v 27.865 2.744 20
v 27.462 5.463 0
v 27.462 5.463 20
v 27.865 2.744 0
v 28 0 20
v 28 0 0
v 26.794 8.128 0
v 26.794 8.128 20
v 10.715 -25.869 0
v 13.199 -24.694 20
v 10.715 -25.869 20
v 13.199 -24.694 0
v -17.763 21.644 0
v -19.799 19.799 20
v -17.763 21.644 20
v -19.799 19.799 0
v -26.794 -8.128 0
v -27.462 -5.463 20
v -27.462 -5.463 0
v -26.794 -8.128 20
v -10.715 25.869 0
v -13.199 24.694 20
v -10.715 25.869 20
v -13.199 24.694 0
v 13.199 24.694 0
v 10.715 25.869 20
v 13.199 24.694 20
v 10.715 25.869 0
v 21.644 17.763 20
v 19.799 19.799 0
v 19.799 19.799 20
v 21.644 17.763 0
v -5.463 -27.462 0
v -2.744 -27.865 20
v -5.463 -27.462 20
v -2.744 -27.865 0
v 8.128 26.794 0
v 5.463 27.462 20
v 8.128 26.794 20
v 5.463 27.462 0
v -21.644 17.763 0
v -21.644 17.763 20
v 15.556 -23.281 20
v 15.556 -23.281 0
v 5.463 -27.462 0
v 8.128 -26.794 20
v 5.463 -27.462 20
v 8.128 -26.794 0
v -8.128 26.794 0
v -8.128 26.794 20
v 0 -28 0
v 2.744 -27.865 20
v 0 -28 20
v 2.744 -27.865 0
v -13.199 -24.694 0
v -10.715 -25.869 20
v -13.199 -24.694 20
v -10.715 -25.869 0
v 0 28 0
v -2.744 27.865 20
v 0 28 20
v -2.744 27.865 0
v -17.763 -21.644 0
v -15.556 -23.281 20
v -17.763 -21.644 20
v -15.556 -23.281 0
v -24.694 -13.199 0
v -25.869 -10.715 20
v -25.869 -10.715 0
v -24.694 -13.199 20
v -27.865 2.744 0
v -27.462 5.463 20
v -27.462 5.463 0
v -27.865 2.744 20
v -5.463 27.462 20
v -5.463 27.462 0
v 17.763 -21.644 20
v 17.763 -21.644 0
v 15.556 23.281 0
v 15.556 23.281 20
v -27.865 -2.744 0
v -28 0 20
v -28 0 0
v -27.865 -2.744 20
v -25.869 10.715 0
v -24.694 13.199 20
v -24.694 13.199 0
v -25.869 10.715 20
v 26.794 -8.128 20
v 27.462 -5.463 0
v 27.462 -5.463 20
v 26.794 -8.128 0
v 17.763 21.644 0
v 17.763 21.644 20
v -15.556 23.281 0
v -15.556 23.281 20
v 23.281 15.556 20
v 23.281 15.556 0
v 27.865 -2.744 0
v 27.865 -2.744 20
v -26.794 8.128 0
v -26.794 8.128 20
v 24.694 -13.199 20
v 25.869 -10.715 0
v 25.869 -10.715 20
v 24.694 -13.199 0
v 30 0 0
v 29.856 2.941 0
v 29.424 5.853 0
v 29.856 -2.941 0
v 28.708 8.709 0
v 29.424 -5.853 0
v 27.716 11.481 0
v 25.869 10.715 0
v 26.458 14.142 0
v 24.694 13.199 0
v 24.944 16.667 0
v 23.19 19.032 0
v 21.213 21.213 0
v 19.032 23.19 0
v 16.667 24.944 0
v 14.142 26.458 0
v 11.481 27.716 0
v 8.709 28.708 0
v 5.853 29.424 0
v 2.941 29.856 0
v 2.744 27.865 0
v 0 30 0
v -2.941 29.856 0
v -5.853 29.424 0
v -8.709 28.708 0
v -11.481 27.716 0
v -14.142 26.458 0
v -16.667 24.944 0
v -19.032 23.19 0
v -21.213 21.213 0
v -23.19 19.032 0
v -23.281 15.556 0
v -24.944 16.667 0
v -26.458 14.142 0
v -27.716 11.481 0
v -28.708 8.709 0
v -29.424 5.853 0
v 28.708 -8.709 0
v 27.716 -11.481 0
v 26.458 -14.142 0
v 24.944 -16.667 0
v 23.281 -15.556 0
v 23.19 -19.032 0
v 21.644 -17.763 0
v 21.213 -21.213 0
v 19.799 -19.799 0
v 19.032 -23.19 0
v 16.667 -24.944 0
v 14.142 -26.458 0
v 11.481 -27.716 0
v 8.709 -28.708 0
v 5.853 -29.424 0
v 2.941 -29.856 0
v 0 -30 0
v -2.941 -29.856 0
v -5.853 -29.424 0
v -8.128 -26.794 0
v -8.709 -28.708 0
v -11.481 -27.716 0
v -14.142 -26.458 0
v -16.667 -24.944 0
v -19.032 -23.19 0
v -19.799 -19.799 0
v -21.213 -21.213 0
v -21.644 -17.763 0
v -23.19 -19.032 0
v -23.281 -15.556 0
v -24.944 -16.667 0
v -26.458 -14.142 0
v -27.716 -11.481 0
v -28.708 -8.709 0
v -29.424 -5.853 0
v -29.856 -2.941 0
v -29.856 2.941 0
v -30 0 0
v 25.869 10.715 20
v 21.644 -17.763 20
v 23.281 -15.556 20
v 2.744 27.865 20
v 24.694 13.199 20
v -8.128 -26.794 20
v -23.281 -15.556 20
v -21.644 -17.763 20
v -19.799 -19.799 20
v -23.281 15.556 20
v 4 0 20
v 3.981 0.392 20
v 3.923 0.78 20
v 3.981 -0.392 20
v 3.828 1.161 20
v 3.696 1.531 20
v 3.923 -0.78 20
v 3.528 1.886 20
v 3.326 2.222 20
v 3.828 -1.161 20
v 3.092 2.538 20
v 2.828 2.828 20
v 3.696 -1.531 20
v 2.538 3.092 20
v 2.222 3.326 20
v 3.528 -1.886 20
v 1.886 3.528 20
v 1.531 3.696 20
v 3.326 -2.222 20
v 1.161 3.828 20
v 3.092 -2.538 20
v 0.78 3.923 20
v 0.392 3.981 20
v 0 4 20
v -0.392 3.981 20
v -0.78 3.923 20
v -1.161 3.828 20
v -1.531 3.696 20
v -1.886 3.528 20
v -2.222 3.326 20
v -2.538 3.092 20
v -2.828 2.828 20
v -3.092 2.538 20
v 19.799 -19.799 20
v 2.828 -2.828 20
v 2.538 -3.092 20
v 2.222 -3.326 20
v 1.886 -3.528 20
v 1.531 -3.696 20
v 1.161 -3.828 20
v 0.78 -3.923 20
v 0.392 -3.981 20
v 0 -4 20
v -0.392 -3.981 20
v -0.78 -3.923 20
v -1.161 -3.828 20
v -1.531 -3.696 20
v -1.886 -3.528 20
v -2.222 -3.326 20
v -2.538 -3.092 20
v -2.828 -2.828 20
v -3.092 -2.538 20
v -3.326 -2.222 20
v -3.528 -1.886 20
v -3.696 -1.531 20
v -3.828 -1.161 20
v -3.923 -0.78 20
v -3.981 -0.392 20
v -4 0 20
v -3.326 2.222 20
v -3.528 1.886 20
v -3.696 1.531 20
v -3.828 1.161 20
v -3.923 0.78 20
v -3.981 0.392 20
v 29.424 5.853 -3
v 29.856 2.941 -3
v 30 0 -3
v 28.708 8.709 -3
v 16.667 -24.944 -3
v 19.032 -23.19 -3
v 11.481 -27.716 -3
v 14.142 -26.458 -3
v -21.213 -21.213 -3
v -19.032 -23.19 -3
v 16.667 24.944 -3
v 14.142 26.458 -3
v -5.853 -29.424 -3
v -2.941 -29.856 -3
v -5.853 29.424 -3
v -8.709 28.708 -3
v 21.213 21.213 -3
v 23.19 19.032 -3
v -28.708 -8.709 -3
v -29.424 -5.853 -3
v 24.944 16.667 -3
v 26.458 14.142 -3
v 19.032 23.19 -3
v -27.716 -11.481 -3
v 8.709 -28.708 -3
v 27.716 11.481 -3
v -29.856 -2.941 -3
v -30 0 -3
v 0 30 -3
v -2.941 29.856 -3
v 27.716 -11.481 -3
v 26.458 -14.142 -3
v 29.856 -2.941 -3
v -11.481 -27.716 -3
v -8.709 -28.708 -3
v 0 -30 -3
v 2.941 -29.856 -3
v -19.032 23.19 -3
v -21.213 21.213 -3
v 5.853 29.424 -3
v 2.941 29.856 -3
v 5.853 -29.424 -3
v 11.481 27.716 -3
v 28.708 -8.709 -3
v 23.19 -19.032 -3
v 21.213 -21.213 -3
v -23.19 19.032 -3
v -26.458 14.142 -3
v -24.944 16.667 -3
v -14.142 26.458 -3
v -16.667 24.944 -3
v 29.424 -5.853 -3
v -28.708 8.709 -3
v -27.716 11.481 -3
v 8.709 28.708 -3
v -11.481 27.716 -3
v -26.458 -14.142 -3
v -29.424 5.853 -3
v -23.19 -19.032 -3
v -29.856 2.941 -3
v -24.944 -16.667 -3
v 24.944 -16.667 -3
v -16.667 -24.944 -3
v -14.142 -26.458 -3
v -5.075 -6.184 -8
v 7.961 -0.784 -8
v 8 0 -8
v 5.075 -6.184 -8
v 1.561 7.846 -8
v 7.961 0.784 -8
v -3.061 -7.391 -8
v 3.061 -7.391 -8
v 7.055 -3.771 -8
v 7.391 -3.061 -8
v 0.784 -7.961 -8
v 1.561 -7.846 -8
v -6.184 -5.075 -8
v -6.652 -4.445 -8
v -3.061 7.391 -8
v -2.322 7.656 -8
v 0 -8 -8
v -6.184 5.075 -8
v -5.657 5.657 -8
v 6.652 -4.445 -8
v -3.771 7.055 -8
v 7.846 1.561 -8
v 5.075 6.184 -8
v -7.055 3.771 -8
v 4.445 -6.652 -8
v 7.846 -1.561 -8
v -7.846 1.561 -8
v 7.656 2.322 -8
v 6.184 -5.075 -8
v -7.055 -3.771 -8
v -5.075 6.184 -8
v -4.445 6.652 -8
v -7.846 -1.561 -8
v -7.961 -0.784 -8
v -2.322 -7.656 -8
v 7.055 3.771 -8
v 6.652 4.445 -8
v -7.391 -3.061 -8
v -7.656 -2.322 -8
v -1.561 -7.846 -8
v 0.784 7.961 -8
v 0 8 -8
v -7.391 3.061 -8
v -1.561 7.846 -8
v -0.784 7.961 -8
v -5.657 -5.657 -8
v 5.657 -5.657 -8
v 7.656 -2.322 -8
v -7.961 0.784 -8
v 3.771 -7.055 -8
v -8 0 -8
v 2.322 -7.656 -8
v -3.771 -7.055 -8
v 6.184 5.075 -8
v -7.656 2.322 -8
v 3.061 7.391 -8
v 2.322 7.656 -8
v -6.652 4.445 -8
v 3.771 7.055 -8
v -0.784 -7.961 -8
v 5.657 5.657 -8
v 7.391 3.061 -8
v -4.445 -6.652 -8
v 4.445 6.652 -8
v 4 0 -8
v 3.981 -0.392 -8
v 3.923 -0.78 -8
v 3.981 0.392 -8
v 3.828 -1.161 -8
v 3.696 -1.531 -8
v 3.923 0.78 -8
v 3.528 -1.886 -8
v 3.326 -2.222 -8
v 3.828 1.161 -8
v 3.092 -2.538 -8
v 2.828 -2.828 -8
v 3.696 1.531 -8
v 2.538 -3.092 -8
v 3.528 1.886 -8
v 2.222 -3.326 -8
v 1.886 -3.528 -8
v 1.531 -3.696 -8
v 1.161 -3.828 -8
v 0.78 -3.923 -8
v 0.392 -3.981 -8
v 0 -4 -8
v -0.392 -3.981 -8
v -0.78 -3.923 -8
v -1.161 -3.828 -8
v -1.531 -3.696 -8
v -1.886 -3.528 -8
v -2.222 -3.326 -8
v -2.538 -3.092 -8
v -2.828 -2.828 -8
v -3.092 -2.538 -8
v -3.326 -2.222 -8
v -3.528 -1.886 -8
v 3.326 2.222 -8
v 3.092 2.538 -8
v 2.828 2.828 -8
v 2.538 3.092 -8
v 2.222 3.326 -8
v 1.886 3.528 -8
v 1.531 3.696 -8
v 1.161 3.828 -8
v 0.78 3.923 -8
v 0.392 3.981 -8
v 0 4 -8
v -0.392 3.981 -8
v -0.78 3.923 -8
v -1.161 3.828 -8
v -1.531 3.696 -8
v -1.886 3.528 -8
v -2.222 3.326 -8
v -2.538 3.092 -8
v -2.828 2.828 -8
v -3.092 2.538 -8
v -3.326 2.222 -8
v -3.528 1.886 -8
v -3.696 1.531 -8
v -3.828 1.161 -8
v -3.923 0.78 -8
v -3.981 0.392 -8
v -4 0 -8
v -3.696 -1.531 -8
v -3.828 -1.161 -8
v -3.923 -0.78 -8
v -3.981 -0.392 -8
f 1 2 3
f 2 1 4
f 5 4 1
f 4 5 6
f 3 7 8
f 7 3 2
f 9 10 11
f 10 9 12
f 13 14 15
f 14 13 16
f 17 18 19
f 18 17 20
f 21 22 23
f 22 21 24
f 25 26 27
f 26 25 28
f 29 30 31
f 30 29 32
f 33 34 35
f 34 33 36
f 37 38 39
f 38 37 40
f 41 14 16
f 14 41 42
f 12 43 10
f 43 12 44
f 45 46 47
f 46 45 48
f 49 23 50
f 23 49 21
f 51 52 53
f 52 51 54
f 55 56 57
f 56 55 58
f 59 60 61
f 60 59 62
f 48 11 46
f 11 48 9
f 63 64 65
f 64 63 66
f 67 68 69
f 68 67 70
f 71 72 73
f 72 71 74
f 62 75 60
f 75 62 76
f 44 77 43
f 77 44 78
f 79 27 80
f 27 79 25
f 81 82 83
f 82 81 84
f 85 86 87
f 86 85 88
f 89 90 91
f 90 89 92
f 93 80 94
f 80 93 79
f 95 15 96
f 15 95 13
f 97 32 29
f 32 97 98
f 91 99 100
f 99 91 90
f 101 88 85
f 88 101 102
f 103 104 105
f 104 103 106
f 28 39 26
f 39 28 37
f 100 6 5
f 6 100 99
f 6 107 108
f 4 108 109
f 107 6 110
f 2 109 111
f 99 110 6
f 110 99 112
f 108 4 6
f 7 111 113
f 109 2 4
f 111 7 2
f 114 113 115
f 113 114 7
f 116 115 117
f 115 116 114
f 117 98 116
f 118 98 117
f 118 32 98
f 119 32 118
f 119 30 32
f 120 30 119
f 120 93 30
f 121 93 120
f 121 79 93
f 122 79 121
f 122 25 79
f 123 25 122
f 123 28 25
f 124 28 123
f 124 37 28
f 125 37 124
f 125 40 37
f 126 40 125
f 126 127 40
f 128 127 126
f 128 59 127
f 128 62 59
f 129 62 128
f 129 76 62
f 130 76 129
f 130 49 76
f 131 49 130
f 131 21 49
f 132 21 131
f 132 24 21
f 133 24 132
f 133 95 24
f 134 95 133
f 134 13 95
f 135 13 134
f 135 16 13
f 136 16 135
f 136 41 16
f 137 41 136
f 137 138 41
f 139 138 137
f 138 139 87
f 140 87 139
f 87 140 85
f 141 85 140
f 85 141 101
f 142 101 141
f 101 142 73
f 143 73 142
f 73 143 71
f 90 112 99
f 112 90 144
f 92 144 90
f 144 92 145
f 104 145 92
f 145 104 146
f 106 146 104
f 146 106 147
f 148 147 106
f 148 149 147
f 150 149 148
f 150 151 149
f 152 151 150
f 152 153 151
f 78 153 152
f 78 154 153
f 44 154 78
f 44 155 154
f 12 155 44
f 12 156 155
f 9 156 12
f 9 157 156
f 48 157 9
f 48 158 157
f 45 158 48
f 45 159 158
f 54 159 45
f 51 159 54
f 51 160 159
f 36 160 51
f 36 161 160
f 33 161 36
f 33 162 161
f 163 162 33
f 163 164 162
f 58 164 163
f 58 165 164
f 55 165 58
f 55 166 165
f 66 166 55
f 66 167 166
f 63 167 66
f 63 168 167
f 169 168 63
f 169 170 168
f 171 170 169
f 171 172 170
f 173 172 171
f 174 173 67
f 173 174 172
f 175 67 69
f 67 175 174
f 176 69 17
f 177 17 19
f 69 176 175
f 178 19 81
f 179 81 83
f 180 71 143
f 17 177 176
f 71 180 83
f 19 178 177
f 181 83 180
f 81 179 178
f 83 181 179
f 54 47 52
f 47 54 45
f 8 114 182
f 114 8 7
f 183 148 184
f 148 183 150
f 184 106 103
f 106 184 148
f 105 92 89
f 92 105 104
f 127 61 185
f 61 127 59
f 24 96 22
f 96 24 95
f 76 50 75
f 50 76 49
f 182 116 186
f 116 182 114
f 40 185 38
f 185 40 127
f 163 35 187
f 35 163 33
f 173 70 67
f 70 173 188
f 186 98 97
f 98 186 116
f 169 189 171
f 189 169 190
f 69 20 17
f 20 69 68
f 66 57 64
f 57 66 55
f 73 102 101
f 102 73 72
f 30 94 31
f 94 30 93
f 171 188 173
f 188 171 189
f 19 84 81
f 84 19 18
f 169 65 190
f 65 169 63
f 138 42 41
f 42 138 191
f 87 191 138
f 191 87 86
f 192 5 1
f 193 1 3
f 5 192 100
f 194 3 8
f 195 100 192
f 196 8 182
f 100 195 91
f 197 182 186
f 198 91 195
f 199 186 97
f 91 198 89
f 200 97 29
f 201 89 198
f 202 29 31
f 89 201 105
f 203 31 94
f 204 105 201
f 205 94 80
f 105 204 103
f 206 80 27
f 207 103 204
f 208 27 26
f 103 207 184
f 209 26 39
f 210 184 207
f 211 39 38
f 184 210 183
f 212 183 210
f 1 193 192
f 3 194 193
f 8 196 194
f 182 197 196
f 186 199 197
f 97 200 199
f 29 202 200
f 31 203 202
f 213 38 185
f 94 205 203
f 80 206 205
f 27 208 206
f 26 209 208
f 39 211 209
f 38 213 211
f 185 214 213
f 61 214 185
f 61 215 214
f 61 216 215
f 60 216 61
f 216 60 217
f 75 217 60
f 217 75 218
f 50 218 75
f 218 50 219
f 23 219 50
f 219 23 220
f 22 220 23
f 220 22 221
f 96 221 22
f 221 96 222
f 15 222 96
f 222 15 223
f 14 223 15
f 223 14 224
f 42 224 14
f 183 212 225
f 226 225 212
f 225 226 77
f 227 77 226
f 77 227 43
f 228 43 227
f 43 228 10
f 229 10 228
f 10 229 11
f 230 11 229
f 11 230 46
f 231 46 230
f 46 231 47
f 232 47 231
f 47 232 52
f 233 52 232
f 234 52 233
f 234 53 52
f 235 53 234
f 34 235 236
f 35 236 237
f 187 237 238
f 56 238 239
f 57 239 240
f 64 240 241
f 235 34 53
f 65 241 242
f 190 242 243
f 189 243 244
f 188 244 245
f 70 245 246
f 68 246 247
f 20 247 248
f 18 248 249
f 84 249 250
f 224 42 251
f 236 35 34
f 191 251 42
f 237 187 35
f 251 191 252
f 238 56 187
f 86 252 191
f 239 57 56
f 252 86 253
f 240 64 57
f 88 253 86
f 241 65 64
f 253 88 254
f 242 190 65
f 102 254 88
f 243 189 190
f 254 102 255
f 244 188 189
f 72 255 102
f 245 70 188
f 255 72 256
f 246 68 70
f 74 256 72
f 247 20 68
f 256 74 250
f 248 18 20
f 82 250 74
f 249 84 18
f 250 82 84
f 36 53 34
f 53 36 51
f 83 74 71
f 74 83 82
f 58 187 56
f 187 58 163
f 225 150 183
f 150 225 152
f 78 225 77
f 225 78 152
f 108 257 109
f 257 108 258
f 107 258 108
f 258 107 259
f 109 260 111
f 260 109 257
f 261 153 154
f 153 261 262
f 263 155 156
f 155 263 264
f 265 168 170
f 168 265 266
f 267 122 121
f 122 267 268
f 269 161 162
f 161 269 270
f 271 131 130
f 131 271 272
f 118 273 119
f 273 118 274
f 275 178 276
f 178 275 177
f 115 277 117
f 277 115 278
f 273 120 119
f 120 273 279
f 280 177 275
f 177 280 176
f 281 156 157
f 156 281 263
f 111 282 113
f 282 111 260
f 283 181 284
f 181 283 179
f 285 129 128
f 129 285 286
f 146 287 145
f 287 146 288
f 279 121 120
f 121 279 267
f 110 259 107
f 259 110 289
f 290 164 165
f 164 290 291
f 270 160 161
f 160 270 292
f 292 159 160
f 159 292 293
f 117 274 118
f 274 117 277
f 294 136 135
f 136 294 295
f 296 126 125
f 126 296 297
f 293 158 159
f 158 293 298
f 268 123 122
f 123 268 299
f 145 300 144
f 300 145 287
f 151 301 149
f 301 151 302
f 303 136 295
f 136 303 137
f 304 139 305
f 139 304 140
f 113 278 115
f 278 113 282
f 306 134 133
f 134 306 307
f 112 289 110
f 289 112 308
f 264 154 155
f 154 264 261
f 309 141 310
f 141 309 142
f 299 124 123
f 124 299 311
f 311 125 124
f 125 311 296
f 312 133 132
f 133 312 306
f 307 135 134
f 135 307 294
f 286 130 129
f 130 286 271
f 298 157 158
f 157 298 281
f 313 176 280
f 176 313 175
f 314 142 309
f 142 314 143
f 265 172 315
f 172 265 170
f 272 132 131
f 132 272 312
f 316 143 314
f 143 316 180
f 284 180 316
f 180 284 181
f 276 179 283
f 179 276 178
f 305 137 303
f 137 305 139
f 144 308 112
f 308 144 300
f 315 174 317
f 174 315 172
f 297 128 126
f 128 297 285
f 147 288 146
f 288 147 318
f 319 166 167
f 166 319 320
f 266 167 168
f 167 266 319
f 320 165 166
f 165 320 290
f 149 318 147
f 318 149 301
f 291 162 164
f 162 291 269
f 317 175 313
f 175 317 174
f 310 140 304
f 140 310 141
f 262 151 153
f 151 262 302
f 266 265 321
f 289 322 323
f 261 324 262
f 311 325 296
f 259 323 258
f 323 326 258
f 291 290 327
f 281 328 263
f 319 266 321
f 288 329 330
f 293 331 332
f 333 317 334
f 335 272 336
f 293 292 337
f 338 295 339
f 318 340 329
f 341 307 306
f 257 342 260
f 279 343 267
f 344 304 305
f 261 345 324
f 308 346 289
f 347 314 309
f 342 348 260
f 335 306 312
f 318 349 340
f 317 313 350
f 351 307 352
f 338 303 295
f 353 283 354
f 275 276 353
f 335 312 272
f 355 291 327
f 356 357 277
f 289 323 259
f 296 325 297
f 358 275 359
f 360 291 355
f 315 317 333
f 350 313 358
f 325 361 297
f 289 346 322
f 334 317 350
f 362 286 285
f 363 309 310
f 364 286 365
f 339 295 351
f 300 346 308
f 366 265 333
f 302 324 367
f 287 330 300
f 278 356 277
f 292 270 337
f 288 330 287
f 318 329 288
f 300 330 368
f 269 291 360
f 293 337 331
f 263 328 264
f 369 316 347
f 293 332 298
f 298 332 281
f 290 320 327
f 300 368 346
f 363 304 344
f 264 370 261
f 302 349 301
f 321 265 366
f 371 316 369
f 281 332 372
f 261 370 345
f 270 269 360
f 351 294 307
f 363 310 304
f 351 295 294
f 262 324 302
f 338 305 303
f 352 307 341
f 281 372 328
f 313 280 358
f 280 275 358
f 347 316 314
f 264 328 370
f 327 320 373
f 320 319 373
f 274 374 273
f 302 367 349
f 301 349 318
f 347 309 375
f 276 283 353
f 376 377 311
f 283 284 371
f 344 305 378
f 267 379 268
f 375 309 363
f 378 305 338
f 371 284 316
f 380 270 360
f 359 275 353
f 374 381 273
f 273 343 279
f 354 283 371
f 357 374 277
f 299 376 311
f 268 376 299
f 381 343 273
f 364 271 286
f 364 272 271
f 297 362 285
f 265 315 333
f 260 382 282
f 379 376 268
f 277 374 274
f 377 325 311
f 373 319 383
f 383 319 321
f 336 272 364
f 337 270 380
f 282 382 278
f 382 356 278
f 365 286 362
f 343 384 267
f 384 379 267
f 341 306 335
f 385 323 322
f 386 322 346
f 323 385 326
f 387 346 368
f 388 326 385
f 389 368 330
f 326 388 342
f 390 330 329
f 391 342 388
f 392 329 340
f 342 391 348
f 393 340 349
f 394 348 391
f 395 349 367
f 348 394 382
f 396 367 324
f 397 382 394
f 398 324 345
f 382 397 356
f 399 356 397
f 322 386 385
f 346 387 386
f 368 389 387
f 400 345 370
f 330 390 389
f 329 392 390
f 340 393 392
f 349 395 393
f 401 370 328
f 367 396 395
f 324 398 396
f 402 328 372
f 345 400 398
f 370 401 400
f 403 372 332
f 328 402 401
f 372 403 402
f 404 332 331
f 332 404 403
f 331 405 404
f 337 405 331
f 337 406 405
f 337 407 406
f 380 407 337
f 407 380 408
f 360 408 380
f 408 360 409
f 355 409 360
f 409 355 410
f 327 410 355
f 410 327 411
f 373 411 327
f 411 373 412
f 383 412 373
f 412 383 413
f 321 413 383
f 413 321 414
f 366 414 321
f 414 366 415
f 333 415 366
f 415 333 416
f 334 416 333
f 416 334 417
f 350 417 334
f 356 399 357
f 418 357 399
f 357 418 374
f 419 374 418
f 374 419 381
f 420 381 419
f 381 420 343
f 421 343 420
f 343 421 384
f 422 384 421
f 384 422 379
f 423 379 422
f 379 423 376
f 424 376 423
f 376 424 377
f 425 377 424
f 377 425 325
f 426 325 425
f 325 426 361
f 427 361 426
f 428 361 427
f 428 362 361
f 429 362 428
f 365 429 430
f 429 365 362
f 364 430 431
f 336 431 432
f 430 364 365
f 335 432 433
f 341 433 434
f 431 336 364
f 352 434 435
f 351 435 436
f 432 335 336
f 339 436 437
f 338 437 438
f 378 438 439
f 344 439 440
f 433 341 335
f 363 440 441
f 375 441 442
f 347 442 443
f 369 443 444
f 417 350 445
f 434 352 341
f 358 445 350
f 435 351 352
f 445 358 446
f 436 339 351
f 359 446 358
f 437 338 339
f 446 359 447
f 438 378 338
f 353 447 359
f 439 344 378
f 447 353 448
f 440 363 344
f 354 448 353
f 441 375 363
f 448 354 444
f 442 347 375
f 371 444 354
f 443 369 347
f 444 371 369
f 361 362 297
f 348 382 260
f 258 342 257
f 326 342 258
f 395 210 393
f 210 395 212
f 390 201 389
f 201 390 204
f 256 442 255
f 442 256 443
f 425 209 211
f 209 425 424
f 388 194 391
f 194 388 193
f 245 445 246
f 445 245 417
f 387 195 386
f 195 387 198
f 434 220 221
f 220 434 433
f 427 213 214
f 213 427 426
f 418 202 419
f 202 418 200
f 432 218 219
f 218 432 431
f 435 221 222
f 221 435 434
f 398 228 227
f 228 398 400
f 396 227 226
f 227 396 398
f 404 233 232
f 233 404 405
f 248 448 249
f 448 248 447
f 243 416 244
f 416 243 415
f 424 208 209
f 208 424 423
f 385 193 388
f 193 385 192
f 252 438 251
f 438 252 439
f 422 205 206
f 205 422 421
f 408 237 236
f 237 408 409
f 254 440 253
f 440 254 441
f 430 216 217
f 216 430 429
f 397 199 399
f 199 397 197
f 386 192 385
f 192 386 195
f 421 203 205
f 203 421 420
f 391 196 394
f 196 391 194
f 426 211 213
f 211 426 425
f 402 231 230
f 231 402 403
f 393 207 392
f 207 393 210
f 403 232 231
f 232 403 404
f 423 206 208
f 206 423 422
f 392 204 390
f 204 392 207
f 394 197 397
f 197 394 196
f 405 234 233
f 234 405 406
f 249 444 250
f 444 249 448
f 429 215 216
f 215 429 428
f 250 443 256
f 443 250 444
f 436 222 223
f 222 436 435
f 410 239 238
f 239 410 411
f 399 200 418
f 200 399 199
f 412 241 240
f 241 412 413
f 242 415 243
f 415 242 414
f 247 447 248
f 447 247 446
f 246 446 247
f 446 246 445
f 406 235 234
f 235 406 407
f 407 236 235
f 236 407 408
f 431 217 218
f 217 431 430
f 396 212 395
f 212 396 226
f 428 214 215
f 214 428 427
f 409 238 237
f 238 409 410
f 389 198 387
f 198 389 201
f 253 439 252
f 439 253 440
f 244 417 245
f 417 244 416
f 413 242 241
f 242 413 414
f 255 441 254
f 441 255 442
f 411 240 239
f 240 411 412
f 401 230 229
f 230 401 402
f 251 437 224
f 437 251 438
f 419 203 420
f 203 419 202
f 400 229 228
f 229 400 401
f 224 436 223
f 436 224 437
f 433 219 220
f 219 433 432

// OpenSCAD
$fn=64;
difference() {
   union() {
      cylinder(r=28,h=20);translate([0,0,-3]) cylinder(r=30,h=3);
      translate([0,0,-8]) cylinder(r1=8,r2=30,h=5);
   }
   cylinder(r=4,h=60,center=true);
}
